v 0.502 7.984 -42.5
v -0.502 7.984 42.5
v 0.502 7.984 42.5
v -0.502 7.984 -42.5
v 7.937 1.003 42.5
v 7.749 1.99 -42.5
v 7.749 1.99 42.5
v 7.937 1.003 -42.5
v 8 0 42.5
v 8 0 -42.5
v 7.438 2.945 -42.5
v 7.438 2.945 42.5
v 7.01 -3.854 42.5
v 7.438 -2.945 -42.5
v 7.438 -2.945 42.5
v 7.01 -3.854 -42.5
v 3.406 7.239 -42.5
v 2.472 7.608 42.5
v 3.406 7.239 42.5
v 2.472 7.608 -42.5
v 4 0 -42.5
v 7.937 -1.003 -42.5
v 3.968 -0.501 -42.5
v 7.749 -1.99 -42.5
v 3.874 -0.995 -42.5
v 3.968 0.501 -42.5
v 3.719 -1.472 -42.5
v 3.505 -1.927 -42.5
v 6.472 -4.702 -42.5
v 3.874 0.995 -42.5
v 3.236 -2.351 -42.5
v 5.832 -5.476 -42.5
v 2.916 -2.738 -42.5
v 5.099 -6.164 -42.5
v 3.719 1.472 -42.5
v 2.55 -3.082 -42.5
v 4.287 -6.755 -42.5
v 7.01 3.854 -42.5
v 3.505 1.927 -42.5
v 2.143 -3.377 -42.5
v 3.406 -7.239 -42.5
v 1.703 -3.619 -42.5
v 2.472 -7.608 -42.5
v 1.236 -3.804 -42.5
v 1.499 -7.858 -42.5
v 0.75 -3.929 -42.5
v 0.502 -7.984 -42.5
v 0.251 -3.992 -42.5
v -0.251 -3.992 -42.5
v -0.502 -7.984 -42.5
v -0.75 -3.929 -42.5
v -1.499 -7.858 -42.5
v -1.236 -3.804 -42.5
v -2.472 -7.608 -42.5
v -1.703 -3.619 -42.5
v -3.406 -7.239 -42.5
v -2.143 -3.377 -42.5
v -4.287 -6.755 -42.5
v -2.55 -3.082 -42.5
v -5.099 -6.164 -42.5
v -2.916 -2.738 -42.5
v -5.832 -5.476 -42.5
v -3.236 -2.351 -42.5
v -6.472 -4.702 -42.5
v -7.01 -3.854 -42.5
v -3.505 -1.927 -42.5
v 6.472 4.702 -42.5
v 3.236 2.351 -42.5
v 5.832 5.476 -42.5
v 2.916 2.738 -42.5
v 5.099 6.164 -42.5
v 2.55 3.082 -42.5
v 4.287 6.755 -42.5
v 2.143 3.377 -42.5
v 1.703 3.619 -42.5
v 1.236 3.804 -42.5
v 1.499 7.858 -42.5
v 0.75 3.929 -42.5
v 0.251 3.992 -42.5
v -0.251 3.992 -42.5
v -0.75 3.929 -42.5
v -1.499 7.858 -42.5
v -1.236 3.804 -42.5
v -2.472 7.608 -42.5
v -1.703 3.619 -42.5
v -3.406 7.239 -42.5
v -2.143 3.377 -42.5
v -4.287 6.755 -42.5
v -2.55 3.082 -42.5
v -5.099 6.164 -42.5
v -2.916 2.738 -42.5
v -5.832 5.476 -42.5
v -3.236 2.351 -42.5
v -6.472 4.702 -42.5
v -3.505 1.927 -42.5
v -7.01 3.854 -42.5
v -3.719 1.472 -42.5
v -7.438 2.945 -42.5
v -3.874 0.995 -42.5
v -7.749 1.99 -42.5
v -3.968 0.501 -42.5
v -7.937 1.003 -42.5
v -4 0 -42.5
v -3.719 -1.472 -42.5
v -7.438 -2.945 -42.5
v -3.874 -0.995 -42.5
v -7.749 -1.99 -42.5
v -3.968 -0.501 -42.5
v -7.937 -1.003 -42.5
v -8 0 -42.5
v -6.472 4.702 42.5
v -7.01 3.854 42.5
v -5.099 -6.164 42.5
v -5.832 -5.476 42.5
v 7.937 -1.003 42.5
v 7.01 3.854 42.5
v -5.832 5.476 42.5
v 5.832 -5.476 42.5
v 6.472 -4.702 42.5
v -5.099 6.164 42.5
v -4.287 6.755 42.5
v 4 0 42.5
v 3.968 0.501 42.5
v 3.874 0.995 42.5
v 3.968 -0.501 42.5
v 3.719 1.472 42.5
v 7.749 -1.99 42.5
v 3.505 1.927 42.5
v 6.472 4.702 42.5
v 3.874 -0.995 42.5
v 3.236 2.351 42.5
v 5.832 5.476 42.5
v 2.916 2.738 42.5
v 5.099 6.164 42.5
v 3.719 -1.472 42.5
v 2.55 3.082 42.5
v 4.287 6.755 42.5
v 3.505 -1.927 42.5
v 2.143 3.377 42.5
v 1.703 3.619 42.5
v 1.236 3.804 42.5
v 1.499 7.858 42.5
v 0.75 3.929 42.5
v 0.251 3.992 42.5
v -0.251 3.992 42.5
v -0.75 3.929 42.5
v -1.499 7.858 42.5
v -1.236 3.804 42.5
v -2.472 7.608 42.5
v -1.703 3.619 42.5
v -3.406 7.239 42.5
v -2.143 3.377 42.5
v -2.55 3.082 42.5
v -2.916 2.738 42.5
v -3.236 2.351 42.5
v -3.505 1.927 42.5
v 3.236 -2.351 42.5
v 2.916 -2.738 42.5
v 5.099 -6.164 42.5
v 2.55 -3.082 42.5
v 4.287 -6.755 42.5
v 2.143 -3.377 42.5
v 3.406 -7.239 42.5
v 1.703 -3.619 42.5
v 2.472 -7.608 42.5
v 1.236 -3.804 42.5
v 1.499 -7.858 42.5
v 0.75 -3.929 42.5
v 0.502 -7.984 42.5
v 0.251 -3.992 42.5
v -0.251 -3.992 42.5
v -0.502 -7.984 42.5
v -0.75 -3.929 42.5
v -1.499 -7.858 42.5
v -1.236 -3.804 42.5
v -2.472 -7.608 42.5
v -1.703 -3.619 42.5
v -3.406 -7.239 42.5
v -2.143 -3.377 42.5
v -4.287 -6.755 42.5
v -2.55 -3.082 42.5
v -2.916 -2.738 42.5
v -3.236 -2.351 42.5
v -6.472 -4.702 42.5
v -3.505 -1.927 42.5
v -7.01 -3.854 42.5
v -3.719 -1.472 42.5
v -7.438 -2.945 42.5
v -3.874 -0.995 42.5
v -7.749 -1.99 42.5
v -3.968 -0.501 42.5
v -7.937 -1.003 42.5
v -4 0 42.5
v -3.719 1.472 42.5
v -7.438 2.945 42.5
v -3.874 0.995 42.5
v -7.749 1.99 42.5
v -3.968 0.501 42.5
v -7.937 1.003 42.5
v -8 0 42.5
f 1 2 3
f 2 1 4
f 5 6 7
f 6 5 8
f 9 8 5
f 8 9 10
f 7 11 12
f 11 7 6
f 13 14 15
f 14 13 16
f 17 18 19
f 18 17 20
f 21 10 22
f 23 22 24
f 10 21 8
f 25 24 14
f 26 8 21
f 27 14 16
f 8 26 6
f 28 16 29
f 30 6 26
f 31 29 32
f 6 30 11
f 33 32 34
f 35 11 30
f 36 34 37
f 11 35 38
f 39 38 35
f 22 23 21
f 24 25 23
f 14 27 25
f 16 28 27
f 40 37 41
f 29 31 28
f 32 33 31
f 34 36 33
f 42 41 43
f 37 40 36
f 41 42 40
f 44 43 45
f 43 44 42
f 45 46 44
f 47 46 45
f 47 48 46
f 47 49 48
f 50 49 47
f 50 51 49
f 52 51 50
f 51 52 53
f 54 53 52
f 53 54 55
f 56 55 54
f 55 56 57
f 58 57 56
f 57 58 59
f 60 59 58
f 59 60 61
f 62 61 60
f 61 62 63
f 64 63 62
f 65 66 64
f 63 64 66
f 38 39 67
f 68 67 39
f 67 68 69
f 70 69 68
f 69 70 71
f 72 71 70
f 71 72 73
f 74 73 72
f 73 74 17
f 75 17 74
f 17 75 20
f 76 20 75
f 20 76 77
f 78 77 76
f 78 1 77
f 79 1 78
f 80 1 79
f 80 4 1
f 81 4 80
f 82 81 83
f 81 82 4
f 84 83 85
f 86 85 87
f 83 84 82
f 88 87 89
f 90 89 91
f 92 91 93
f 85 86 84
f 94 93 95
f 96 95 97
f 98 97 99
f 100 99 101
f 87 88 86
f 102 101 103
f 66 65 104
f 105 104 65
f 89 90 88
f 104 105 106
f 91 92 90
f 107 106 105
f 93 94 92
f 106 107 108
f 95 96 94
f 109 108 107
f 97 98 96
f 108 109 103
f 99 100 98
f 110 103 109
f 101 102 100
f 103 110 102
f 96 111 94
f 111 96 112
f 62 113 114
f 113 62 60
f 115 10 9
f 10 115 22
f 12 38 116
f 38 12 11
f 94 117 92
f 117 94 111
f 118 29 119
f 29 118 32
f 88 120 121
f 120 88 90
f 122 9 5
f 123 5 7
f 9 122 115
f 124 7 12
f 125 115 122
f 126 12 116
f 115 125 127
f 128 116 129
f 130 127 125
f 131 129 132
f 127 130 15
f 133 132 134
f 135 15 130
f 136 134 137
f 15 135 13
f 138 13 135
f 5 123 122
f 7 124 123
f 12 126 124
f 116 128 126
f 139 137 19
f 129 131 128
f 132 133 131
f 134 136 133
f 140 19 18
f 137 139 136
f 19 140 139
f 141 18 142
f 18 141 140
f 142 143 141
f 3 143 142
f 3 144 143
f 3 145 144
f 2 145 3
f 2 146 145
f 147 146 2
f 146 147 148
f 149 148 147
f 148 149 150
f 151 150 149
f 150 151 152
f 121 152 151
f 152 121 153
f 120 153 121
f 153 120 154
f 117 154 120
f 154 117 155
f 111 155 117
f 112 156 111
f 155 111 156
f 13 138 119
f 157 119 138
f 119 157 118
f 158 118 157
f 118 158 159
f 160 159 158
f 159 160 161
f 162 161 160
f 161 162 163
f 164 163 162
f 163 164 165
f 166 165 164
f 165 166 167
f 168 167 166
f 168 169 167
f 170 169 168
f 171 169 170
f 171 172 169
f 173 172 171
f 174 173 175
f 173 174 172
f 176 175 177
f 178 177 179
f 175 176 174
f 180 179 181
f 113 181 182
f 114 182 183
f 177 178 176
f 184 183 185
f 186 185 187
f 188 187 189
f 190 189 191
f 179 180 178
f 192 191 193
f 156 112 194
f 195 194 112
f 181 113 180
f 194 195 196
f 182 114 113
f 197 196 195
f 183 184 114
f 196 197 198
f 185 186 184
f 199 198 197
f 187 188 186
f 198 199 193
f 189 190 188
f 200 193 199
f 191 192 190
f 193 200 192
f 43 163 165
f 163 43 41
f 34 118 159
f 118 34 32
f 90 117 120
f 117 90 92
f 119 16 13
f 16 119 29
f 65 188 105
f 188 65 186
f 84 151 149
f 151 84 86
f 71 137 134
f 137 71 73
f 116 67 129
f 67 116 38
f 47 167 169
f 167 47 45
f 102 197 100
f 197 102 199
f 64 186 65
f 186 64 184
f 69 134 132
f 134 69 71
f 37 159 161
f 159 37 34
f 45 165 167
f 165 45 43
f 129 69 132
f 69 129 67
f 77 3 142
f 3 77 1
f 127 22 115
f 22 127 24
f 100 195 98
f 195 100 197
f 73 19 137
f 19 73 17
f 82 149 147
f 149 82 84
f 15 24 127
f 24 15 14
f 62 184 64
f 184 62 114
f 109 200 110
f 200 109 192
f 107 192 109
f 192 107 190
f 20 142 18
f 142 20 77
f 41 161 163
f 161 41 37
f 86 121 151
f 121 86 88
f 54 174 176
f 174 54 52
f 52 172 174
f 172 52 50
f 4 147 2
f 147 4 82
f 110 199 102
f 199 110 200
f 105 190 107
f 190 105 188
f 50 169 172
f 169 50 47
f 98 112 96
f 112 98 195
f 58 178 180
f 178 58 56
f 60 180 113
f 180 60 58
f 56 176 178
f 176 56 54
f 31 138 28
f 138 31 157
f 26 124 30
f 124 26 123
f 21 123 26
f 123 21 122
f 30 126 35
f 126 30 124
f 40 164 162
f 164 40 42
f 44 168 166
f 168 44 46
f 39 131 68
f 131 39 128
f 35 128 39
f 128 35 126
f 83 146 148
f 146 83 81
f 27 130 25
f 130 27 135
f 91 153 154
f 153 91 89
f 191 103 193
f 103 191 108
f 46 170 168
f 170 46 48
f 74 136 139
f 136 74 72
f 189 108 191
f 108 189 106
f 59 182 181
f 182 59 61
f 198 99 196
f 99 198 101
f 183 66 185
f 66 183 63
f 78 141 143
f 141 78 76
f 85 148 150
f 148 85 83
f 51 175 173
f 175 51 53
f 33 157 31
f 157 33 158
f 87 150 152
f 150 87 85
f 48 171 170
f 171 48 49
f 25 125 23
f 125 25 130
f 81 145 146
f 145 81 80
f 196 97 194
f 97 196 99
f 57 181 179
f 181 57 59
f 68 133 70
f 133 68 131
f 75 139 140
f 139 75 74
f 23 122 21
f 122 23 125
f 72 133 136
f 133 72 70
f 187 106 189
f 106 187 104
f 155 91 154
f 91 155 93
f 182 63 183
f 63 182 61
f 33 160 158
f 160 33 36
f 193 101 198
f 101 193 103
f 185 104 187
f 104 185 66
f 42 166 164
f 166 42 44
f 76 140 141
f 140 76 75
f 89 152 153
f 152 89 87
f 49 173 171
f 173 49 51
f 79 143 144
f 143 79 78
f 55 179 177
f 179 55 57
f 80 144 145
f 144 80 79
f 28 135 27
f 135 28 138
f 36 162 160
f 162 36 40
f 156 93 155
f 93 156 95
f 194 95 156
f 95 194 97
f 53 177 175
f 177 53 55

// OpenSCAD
$fn = 50;


difference() {
	union() {
		translate(v = [0, 0, -42.5000000000]) {
			cylinder(h = 85, r = 8.0000000000);
		}
	}
	union() {
		translate(v = [0, 0, -100.0000000000]) {
			cylinder(h = 200, r = 4.0000000000);
		}
	}
}
